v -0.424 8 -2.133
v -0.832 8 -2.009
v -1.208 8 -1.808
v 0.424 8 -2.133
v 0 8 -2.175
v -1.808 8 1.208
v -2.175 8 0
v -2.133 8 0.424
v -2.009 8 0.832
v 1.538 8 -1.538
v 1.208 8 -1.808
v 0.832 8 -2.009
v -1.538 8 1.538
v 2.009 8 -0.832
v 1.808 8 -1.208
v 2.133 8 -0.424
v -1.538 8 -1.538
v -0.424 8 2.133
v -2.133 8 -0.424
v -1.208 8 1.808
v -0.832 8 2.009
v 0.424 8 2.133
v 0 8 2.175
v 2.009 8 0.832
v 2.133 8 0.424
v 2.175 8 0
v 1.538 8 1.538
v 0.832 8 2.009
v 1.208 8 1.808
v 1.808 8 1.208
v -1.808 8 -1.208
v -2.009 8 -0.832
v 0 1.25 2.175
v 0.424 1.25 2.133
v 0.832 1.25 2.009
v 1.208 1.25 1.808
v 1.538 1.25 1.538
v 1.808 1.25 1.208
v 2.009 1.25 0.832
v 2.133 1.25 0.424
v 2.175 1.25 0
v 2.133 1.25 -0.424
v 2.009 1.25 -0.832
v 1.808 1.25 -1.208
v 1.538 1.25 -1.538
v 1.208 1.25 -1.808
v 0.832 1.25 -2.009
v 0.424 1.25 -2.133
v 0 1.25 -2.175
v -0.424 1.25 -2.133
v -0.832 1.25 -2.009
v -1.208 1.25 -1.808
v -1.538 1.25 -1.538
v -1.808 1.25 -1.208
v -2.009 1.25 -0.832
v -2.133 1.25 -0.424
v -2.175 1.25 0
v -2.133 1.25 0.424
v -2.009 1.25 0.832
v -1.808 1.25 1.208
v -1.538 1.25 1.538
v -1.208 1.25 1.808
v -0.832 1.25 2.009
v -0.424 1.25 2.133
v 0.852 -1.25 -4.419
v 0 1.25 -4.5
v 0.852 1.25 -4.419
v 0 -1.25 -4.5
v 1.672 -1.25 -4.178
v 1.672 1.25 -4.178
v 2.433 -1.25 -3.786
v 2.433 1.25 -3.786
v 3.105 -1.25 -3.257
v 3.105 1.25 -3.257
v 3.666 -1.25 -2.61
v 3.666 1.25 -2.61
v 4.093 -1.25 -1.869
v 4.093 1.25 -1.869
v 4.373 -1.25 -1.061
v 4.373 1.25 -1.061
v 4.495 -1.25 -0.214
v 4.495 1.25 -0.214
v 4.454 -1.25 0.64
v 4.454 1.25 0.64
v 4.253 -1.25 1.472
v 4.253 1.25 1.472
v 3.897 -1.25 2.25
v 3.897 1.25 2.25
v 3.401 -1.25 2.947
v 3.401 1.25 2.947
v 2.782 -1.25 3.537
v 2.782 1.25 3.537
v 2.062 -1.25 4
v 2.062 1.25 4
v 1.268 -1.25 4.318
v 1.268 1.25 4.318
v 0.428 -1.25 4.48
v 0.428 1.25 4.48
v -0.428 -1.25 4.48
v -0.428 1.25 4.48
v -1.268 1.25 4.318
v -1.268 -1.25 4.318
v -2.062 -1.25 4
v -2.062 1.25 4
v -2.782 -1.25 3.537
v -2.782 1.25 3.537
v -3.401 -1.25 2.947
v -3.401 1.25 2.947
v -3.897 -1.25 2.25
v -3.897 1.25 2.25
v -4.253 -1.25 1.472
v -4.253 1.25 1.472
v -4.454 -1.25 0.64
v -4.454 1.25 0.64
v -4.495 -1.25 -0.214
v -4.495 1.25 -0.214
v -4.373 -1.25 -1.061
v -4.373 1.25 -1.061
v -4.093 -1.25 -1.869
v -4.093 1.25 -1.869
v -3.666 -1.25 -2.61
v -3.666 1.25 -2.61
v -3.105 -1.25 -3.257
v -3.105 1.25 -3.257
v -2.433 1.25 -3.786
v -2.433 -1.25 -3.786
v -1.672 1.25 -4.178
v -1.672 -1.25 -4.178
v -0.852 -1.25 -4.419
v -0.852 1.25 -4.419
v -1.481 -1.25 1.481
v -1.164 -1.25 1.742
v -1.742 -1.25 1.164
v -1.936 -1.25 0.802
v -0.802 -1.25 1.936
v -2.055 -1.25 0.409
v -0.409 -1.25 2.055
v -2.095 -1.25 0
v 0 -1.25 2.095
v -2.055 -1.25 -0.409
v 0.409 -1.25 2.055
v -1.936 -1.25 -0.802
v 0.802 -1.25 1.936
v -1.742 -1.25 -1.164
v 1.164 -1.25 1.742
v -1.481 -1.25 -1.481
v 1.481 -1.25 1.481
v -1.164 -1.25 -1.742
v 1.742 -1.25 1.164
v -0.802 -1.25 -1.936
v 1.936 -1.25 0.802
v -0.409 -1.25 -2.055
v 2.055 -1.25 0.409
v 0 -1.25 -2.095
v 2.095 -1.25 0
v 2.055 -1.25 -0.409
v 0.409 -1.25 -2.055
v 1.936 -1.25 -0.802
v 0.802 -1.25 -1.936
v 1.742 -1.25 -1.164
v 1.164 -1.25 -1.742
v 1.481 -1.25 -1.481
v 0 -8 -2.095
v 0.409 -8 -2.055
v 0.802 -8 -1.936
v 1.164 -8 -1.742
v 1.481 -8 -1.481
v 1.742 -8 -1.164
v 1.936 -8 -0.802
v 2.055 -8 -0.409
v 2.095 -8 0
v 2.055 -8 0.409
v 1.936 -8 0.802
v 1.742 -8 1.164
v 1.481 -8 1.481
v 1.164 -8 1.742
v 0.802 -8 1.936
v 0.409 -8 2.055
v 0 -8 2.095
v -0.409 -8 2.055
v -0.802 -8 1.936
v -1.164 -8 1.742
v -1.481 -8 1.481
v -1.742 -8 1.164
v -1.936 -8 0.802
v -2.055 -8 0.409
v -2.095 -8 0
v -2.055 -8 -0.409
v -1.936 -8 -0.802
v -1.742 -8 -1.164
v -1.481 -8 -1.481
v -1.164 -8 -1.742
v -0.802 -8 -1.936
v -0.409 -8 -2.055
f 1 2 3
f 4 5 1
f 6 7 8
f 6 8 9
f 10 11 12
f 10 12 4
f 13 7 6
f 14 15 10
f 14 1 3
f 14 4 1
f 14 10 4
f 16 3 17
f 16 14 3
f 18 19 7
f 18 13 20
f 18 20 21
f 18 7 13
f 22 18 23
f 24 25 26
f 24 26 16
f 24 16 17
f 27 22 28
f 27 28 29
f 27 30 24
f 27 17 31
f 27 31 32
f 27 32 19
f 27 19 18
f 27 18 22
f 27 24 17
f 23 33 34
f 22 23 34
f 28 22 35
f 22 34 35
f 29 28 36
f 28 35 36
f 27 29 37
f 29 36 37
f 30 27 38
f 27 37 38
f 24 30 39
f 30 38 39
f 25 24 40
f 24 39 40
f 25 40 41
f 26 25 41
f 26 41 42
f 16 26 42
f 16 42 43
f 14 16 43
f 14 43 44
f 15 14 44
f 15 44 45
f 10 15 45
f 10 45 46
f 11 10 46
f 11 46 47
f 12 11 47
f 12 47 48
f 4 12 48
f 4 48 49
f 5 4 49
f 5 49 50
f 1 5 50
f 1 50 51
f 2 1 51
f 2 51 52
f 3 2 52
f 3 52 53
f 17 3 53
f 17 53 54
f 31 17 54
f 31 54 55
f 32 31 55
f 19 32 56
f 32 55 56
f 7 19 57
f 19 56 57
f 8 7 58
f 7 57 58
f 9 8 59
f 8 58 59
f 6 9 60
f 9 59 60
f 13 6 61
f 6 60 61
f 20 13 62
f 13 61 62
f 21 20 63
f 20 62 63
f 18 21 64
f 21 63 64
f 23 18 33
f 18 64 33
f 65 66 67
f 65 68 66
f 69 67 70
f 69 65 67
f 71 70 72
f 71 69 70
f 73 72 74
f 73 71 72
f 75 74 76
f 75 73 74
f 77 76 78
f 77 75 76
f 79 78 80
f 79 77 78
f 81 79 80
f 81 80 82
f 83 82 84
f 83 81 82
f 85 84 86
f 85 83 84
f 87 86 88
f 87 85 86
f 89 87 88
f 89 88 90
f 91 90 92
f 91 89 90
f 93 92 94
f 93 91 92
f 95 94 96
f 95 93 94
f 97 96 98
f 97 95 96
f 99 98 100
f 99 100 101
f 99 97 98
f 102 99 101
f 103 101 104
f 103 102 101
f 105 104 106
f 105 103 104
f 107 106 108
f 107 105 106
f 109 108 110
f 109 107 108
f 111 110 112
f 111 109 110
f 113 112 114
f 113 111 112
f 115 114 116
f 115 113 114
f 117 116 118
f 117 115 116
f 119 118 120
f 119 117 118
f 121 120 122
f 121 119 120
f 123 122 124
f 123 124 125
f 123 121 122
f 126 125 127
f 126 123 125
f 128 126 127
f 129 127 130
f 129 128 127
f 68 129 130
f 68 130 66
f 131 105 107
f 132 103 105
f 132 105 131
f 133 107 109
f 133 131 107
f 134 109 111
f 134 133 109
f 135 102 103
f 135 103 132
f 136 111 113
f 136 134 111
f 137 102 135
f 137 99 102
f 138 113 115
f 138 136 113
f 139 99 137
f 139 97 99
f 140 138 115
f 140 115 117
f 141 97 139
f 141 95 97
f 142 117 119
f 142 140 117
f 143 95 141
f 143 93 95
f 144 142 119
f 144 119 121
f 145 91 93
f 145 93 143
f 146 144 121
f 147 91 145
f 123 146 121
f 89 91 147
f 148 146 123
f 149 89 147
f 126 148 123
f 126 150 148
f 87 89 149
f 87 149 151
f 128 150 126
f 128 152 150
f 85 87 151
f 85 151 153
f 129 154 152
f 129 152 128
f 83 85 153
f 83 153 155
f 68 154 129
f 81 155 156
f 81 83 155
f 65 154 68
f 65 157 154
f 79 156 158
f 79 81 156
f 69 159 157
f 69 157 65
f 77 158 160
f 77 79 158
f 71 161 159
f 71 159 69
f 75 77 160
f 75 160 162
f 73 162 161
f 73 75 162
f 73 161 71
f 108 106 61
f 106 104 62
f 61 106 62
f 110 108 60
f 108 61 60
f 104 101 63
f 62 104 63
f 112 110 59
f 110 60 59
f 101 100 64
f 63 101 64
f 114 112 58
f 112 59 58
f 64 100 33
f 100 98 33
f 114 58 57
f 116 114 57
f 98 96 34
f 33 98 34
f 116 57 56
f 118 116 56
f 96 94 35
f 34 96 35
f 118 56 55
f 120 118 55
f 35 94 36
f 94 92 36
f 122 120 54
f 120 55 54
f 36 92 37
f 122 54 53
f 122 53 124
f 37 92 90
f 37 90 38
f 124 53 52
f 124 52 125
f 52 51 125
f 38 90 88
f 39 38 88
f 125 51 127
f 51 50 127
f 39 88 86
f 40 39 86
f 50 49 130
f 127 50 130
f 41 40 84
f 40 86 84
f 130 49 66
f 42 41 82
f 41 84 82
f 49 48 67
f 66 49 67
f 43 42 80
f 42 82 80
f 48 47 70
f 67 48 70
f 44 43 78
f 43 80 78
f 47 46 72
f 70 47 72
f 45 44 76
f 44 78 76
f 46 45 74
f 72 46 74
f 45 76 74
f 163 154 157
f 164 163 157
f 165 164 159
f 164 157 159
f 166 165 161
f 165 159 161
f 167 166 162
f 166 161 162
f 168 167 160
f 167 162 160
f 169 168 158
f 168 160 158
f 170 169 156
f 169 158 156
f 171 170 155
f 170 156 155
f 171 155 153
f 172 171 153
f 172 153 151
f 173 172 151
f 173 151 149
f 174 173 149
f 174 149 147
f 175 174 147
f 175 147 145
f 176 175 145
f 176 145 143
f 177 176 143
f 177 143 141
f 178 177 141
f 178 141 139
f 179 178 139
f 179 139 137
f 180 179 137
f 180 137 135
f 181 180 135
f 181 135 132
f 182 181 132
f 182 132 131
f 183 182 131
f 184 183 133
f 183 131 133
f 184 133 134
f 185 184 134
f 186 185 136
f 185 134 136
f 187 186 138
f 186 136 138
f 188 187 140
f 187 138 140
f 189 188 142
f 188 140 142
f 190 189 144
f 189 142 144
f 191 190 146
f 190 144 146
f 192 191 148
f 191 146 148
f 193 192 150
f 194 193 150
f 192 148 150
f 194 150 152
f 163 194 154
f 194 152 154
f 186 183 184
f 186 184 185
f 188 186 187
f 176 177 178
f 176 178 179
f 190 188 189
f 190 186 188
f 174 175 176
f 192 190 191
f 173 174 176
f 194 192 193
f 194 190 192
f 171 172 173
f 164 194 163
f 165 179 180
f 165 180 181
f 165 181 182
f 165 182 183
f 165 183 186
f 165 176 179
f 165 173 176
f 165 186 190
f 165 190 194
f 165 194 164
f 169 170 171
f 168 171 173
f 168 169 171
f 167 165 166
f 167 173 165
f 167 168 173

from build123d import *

# Parameters (mm, degrees)
SKETCH2_R           = 2.175
BOSS_EXTRUDE2_DEPTH = 8
SKETCH5_R           = 2.095
BOSS_EXTRUDE3_DEPTH = 8
SKETCH7_R           = 4.5
BOSS_EXTRUDE4_DEPTH = 1.25


with BuildPart() as part:
    # Sketch2 → Boss-Extrude2 (new body)
    with BuildSketch(Plane(origin=(0, 0, 0), x_dir=(1, 0, 0), z_dir=(0, 1, 0))):
        with Locations(Location((0, 0, 0), (0, 0, 270))):
            Circle(SKETCH2_R)
    extrude(amount=BOSS_EXTRUDE2_DEPTH)

    # Sketch5 → Boss-Extrude3 (add)
    with BuildSketch(Plane(origin=(0, 0, 0), x_dir=(-1, 0, 0), z_dir=(0, -1, 0))):
        with Locations(Location((0, 0, 0), (0, 0, 90))):
            Circle(SKETCH5_R)
    extrude(amount=BOSS_EXTRUDE3_DEPTH)

    # Sketch7 → Boss-Extrude4 (add, symmetric)
    with BuildSketch(Plane(origin=(0, 0, 0), x_dir=(-1, 0, 0), z_dir=(0, -1, 0))):
        with Locations(Location((0, 0, 0), (0, 0, 90))):
            Circle(SKETCH7_R)
    extrude(amount=BOSS_EXTRUDE4_DEPTH, both=True)


solid = part.part
